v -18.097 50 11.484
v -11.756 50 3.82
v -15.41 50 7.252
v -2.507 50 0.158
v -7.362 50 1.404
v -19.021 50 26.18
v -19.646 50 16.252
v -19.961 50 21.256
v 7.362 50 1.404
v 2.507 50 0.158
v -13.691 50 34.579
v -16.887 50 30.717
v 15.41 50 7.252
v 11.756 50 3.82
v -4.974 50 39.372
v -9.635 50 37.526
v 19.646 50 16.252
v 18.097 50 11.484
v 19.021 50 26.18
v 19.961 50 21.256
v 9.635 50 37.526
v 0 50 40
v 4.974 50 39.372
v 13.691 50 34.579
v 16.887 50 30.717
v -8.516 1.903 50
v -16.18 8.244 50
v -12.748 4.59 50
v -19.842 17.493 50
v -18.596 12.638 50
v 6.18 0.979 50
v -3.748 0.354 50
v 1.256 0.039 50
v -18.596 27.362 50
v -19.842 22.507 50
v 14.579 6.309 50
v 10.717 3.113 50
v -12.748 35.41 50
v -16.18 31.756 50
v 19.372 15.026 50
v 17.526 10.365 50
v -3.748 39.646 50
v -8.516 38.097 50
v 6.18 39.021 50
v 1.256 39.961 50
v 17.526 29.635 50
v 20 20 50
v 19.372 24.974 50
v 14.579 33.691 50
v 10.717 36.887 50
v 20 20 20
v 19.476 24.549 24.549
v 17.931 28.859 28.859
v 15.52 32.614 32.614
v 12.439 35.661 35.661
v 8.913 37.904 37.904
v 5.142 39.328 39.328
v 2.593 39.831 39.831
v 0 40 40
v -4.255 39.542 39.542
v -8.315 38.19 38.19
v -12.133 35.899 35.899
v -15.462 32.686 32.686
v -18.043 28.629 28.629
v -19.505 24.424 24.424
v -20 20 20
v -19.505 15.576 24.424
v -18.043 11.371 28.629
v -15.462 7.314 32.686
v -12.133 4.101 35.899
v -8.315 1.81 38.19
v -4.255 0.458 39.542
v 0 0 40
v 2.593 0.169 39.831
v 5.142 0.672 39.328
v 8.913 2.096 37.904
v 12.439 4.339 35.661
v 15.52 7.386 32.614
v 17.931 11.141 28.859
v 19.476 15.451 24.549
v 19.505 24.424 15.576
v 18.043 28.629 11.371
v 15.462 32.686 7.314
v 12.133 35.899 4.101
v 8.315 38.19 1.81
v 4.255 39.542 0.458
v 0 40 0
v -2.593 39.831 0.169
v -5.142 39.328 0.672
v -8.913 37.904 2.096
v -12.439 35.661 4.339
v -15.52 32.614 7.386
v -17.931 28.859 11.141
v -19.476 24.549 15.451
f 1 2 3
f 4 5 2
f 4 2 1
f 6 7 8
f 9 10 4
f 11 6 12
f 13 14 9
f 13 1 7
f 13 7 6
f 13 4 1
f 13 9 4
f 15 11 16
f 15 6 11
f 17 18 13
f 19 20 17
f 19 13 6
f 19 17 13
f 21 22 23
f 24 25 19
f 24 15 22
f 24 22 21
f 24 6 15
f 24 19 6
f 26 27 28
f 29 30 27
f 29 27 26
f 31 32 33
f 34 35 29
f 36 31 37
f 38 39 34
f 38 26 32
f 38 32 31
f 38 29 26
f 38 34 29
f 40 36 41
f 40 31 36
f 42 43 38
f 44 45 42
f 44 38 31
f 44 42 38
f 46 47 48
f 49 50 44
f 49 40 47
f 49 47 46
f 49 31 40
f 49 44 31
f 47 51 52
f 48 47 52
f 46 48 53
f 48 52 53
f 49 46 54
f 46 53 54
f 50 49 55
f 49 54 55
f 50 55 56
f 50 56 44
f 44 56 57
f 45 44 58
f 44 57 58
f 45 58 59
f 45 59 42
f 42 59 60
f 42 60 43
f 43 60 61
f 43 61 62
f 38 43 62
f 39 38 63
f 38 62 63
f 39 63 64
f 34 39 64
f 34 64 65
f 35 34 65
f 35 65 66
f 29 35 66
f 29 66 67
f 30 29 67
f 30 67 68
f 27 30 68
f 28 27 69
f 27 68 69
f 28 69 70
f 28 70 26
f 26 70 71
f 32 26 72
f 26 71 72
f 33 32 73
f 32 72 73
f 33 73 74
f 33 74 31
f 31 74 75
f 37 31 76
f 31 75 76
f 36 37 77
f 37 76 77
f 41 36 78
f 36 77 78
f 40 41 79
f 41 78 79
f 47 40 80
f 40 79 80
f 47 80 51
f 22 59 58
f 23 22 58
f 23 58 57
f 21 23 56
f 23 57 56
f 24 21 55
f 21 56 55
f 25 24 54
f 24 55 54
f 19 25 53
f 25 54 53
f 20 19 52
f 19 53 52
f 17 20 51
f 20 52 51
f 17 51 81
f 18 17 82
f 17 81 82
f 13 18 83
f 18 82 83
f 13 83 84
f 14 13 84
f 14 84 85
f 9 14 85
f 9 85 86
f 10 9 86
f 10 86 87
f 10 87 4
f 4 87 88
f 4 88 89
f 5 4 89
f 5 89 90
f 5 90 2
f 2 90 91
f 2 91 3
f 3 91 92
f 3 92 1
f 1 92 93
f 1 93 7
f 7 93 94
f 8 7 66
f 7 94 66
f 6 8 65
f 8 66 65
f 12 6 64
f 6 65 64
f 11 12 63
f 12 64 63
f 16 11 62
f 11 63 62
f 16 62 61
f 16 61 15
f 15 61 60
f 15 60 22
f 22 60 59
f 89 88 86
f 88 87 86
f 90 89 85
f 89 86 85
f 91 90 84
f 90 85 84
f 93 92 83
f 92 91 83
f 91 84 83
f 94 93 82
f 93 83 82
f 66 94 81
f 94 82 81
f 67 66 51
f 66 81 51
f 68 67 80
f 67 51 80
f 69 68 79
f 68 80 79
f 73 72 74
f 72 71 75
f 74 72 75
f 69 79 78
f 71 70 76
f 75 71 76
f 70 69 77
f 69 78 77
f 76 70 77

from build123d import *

# Parameters (mm, degrees)
SKETCH_3_R          = 20
EXTRUDE_2_DEPTH     = 50
SKETCH_4_R          = 20
EXTRUDE_3_DEPTH     = 50
CUT_EXTRUDE_1_DEPTH = 40
CUT_EXTRUDE_2_DEPTH = 40


with BuildPart() as part:
    # 草图3 → 凸台-拉伸2 (new body)
    with BuildSketch(Plane(origin=(0, 0, 0), x_dir=(1, 0, 0), z_dir=(0, 1, 0))):
        with Locations((0, -20)):
            Circle(SKETCH_3_R)
    extrude(amount=EXTRUDE_2_DEPTH)

    # 草图4 → 凸台-拉伸3 (add)
    with BuildSketch(Plane.XY):
        with Locations((0, 20)):
            Circle(SKETCH_4_R)
    extrude(amount=EXTRUDE_3_DEPTH)

    # 草图5 → 切除-拉伸1 (cut)
    with BuildSketch(Plane(origin=(0, 0, 0), x_dir=(0, 0, -1), z_dir=(1, 0, 0))):
        Polygon((0, 40), (-40, 0), (-40, -16.797302677), (11.409985675, -16.797302677), align=None)
    extrude(amount=-CUT_EXTRUDE_1_DEPTH, mode=Mode.SUBTRACT)

    # 草图6 → 切除-拉伸2 (cut)
    with BuildSketch(Plane.ZY):
        Polygon((0, 40), (40, 0), (42.840082068, -18.175854473), (-20.897665684, -9.087927237), align=None)
    extrude(amount=-CUT_EXTRUDE_2_DEPTH, mode=Mode.SUBTRACT)


solid = part.part
